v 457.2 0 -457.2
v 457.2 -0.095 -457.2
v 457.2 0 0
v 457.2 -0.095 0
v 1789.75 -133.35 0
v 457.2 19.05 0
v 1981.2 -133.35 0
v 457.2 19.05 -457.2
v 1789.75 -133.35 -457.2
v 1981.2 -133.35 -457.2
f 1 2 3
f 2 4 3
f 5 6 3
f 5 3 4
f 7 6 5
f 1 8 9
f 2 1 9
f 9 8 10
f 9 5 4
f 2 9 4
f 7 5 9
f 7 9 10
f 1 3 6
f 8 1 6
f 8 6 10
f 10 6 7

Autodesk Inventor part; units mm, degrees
ref_plane "YZ Plane" through (0, 0, 0) normal (1, 0, 0) x (0, 1, 0)
ref_plane "XZ Plane" through (0, 0, 0) normal (0, 1, 0) x (-1, 0, 0)
ref_plane "XY Plane" through (0, 0, 0) normal (0, 0, 1) x (1, 0, 0)
sketch "Sketch1" plane through (0, 0, 0) normal (0, 0, 1) x (1, 0, 0)
  line L0 (457.2, 0) -> (457.2, 19.05) projected
  line L1 (457.2, -133.35) -> (457.2, 0) projected
  line L2 (0, 0) -> (0, -133.35) projected
  line L3 (457.2, 19.05) -> (1981.2, -133.35)
  line L4 (1789.7499, -133.35) -> (457.2, -0.095)
  line L5 (1789.7499, -133.35) -> (1981.2, -133.35)
  dimension "d3" = 19.05
  dimension "d4" = 1981.2
extrude "Extrusion1" add sketch "Sketch1" against normal blind 457.2
properties part number "Ramp1"
